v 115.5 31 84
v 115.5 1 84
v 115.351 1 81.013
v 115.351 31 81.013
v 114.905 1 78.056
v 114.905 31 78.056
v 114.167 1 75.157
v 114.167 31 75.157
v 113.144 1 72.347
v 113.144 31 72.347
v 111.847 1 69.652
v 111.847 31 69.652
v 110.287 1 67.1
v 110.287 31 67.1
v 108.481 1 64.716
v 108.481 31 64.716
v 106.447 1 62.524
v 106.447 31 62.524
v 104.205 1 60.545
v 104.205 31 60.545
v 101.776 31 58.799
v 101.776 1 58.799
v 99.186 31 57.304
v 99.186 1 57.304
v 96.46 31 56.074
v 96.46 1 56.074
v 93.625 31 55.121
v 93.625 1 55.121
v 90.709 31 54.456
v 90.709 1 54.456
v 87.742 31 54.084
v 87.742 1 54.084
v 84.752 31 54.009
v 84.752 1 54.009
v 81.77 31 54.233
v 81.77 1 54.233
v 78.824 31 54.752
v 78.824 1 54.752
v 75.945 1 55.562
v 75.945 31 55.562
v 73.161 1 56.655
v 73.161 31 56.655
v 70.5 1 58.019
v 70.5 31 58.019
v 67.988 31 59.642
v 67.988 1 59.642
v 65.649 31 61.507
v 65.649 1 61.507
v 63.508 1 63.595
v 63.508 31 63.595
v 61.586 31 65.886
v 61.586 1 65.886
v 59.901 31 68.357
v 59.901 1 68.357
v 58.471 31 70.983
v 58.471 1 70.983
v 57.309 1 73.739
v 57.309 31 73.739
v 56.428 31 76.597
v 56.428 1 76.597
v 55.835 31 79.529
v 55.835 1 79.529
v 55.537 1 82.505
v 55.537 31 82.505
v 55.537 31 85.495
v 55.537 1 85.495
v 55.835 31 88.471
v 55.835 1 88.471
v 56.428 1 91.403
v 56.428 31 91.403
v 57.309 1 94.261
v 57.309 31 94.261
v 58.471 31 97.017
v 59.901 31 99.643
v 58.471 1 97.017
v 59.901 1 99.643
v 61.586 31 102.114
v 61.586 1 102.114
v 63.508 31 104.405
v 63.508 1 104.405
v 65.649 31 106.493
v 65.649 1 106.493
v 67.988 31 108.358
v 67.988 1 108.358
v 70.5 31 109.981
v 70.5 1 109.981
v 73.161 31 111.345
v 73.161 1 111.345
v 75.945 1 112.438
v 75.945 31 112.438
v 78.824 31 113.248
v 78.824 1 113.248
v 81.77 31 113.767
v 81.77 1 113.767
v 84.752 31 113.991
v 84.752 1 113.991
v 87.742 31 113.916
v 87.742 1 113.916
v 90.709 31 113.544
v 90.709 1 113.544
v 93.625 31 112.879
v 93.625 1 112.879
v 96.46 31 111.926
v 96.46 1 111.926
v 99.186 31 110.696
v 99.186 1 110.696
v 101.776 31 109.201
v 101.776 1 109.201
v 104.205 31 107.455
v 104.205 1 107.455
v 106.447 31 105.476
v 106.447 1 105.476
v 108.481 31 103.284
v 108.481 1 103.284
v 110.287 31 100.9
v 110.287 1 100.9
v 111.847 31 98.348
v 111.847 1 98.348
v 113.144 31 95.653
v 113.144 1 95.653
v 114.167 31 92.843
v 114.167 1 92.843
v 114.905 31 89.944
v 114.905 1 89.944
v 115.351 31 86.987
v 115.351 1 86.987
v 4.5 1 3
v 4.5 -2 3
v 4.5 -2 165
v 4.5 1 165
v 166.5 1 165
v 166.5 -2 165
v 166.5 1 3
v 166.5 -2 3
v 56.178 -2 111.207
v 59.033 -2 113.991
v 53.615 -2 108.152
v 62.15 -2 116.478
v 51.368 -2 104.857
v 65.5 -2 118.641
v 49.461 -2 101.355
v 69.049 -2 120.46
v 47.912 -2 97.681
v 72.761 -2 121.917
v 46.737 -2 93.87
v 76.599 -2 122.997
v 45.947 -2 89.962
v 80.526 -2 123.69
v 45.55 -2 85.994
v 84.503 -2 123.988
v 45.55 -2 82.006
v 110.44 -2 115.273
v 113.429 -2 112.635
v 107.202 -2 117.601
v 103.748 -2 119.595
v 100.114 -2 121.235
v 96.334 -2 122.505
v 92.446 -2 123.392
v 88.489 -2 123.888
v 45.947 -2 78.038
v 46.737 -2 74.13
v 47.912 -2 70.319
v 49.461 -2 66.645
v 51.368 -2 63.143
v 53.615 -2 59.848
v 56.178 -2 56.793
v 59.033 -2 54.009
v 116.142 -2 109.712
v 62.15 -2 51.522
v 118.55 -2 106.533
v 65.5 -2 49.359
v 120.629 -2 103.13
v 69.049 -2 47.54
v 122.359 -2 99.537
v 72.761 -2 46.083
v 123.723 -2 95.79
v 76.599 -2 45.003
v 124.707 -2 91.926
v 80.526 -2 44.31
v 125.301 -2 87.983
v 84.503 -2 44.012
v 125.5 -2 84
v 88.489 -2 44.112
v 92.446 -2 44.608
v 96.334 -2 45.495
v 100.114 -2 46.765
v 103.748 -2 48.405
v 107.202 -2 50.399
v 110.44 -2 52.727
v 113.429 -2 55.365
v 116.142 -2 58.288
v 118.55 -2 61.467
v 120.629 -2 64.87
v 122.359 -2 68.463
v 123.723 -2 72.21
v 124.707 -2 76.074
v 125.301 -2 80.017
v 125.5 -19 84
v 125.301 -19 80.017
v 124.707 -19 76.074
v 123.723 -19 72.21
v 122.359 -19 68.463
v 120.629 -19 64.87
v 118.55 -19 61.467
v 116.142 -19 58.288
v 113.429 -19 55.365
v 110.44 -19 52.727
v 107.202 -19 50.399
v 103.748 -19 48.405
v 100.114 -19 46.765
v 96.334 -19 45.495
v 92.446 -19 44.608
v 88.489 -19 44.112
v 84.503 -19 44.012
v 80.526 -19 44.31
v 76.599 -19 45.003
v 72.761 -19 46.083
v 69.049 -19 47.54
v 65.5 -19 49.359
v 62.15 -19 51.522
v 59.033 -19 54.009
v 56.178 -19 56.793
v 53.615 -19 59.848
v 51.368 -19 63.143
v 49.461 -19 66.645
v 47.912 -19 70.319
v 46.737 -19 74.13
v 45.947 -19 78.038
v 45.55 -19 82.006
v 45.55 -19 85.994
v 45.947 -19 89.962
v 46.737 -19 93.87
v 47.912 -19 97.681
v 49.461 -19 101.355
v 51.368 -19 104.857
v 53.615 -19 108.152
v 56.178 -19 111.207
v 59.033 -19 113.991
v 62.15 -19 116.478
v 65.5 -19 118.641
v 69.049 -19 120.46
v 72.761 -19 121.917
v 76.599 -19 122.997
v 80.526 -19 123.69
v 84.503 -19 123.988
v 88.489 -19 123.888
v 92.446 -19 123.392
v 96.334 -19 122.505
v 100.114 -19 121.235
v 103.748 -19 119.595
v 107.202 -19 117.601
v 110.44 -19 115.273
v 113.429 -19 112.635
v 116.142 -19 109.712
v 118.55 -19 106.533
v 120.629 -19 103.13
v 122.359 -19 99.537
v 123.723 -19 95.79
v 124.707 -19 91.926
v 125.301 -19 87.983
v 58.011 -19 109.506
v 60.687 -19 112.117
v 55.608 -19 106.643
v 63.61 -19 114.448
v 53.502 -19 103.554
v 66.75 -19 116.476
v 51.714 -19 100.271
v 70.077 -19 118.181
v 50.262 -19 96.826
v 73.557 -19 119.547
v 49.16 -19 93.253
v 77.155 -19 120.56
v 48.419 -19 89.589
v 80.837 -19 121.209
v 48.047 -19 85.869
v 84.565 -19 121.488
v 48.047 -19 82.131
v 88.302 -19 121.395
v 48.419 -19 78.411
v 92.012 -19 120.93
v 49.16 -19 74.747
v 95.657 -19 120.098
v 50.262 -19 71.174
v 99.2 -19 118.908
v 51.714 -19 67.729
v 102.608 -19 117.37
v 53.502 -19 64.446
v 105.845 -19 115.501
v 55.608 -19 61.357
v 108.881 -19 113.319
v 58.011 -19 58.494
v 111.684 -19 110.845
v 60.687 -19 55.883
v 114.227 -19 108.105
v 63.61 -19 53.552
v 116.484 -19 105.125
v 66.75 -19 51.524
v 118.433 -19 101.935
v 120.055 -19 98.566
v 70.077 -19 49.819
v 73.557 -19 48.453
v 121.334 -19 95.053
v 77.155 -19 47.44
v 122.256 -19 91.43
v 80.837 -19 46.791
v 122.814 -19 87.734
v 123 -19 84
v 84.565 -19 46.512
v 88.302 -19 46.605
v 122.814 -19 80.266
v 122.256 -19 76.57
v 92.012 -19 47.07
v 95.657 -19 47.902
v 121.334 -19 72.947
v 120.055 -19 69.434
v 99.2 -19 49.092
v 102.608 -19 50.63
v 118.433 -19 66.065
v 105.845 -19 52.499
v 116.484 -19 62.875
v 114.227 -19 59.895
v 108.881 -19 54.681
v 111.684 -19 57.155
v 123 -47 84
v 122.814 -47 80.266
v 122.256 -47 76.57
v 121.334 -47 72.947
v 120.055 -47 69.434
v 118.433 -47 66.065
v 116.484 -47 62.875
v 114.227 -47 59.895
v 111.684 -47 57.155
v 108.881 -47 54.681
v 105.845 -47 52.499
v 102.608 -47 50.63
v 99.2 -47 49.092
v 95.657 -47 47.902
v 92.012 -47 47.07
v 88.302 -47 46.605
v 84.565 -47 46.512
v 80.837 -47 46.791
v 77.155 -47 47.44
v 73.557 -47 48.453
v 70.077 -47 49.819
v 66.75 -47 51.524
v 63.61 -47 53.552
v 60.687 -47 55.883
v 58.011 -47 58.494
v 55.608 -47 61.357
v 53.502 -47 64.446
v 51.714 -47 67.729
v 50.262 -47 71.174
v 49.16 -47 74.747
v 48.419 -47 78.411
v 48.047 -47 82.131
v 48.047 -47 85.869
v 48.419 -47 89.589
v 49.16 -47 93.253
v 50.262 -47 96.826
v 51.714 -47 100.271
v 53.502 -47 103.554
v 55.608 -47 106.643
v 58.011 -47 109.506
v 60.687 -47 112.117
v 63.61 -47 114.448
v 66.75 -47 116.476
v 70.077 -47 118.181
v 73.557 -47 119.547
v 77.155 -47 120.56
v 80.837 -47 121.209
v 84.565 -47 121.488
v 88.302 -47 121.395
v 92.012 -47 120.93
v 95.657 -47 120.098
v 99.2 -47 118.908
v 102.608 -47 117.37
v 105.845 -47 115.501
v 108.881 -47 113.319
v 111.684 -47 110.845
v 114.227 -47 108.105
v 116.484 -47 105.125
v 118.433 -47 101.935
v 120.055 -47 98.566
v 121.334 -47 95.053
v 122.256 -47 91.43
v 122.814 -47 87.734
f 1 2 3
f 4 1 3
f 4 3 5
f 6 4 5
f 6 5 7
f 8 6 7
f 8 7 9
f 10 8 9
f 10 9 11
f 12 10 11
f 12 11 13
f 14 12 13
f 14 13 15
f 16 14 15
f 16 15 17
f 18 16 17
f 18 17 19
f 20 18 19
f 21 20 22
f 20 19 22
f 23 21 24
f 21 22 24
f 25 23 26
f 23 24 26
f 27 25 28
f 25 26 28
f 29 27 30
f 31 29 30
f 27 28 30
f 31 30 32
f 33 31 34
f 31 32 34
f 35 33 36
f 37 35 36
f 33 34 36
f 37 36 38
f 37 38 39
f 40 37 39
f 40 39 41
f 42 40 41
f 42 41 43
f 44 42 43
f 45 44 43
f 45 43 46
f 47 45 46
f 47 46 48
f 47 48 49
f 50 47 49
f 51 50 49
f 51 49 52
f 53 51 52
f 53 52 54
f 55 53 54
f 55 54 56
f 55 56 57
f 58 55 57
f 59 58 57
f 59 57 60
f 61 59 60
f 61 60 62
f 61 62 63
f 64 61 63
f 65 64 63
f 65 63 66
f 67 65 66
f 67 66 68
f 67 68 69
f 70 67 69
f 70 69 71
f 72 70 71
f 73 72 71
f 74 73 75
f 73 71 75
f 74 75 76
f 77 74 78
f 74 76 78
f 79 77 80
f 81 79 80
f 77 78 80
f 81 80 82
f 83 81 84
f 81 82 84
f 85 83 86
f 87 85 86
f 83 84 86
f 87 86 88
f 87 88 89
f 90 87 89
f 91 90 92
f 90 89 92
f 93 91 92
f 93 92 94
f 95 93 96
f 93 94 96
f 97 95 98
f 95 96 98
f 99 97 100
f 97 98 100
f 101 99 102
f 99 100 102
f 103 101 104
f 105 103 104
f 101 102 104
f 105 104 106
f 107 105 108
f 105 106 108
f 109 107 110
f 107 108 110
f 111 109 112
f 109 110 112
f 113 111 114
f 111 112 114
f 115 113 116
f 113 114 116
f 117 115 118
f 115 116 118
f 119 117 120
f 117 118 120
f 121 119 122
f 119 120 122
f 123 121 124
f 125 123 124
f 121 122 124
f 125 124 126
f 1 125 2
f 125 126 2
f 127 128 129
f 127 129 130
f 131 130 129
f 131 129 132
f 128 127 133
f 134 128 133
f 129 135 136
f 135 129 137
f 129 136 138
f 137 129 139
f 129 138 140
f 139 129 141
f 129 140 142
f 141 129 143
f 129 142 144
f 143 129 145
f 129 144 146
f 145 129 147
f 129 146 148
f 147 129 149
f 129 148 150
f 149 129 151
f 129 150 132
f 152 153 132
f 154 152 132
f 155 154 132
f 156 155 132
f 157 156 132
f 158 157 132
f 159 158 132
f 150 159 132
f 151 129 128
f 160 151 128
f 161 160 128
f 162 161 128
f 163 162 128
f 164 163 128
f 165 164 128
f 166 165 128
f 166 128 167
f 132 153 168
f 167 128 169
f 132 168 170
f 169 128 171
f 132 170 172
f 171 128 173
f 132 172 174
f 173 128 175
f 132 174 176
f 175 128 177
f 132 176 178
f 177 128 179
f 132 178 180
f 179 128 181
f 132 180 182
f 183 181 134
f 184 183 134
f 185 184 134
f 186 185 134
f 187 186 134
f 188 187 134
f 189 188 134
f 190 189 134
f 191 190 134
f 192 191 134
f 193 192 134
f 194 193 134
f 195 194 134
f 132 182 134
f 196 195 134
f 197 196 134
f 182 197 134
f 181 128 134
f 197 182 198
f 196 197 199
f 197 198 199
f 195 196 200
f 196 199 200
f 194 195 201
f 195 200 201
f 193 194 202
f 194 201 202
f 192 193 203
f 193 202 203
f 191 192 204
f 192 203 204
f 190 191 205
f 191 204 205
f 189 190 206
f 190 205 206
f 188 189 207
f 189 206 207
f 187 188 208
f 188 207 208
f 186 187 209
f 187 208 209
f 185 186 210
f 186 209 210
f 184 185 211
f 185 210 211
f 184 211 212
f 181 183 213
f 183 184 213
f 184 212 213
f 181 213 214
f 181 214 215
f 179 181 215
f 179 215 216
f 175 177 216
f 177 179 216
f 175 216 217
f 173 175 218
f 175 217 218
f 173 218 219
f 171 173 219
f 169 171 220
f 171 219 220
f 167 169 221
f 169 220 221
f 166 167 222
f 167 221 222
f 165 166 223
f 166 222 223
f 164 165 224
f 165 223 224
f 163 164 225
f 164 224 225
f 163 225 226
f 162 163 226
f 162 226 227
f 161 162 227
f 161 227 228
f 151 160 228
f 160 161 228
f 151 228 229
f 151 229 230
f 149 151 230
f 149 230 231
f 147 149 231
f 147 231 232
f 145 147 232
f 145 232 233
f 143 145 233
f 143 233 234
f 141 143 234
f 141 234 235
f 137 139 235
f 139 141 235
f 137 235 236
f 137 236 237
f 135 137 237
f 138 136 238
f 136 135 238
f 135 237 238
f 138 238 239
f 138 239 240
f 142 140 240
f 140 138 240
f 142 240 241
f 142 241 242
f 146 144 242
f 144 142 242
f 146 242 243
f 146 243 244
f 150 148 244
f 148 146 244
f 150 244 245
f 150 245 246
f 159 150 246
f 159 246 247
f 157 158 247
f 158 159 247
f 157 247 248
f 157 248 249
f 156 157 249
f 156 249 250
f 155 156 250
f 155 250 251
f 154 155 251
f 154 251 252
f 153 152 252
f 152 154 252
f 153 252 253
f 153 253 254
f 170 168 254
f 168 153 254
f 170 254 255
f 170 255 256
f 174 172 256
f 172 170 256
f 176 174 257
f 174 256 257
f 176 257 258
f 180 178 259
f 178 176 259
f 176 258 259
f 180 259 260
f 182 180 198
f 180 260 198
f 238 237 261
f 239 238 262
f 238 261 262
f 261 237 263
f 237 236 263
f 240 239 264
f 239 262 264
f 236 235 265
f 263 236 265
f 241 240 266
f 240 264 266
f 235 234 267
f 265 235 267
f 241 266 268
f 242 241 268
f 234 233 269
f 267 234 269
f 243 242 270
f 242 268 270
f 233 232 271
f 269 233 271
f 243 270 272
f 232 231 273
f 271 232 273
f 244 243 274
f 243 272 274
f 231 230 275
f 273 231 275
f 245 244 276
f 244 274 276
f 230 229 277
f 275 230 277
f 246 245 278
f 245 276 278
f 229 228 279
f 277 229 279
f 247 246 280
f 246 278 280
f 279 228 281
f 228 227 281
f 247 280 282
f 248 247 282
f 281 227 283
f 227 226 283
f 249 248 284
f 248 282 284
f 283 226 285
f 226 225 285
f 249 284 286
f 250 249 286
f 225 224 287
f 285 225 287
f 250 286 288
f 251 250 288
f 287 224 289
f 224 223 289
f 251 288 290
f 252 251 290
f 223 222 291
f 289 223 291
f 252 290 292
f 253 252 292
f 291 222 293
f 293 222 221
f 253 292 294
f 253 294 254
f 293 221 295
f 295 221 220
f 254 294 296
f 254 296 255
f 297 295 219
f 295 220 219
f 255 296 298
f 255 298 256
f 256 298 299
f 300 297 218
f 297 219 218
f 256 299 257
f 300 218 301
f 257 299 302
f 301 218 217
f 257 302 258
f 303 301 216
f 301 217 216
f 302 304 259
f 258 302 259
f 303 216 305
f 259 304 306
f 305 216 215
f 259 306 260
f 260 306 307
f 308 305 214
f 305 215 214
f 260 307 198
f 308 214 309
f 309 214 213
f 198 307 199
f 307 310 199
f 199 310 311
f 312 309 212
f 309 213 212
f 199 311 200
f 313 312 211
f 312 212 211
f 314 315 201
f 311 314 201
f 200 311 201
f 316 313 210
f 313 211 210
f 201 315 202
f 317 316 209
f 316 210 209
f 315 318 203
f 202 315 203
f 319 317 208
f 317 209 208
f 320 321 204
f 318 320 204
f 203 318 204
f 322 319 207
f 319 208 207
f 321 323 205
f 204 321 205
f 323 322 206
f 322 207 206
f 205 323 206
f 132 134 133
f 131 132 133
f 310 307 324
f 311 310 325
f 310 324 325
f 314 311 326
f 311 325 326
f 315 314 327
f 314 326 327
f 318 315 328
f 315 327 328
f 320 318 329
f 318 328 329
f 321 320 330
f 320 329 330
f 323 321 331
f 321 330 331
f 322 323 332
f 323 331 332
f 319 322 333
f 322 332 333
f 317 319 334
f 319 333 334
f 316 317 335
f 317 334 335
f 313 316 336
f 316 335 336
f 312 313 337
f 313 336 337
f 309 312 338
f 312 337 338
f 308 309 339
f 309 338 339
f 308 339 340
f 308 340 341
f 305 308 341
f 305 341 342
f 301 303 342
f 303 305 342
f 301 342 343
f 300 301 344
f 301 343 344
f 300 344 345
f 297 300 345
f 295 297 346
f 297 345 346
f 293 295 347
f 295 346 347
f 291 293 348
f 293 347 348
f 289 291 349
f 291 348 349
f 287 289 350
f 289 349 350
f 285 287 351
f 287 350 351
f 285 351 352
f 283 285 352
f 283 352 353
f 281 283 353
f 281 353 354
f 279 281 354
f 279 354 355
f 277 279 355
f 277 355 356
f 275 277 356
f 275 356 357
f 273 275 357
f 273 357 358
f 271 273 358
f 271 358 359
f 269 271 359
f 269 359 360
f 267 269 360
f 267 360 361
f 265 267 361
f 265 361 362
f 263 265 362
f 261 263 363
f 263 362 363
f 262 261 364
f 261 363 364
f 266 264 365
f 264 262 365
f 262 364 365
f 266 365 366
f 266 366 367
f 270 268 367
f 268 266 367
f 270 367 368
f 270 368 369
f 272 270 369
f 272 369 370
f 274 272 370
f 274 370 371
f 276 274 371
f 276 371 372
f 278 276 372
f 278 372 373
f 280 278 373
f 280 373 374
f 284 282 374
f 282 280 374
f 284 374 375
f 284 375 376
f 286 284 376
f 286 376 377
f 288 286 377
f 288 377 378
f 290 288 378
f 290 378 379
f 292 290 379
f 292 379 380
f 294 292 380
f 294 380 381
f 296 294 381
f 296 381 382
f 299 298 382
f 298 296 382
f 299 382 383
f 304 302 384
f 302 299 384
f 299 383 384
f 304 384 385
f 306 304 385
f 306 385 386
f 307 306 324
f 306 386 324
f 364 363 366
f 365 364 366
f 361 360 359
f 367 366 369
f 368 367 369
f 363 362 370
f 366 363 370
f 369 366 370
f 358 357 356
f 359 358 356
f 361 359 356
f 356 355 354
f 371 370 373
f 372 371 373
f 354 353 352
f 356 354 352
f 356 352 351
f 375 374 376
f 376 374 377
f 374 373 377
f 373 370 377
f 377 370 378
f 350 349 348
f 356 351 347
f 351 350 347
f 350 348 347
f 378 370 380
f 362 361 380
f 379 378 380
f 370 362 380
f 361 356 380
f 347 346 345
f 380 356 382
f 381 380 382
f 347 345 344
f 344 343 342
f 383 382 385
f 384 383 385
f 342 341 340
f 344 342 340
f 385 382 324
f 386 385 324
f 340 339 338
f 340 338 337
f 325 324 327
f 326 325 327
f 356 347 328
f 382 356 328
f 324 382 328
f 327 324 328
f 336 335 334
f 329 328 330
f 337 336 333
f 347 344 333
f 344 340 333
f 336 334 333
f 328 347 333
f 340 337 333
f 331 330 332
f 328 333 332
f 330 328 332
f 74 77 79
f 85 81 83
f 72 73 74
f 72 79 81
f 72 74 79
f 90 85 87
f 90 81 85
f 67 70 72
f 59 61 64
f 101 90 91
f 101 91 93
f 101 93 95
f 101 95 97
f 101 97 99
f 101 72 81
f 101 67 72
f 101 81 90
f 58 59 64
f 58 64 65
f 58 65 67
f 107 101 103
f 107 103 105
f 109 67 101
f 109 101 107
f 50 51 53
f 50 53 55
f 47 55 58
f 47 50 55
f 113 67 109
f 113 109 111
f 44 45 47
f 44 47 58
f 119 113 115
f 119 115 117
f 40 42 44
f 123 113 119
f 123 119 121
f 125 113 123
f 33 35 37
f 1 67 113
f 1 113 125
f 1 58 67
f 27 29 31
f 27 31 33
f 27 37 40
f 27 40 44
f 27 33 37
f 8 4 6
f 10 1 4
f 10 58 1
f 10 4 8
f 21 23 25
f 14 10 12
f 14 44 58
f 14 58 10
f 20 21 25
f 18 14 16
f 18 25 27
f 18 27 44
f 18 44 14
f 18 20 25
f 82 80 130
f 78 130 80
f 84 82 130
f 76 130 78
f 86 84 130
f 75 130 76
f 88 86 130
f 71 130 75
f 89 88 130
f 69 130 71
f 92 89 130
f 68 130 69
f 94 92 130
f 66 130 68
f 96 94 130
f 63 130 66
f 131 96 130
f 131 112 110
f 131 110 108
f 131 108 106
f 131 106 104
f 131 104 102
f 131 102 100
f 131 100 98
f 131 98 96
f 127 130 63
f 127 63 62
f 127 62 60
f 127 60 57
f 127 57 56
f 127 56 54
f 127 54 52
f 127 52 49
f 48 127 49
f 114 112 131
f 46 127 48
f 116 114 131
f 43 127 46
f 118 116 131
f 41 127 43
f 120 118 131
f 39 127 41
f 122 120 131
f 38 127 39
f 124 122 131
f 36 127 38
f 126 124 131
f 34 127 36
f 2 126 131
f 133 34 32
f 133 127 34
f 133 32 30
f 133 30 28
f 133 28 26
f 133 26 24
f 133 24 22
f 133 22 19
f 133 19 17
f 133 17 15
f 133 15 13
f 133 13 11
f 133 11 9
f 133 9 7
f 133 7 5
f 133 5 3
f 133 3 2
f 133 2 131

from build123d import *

# Parameters (mm, degrees)
BOX035_W          = 162
BOX035_H          = 3
BOX035_DEPTH      = 162
CYLINDER010_R     = 30
CYLINDER010_DEPTH = 31
CYLINDER011_R     = 37.5
CYLINDER011_DEPTH = 46
CYLINDER012_R     = 40
CYLINDER012_DEPTH = 18


with BuildPart() as cube030:
    # Box035 → Box035 (new body)
    with BuildSketch(Plane.XY):
        with Locations((81, 1.5)):
            Rectangle(BOX035_W, BOX035_H)
    extrude(amount=BOX035_DEPTH)


with BuildPart() as cylinder010:
    # Cylinder010 → Cylinder010 (new body)
    with BuildSketch(Plane(origin=(81, 2, 81), x_dir=(1, 0, 0), z_dir=(0, 1, 0))):
        Circle(CYLINDER010_R)
    extrude(amount=CYLINDER010_DEPTH)


with BuildPart() as cylinder011:
    # Cylinder011 → Cylinder011 (new body)
    with BuildSketch(Plane(origin=(81, -45, 81), x_dir=(1, 0, 0), z_dir=(0, 1, 0))):
        Circle(CYLINDER011_R)
    extrude(amount=CYLINDER011_DEPTH)


with BuildPart() as f_240mm:
    # Cylinder012 → Cylinder012 (new body)
    with BuildSketch(Plane(origin=(81, -17, 81), x_dir=(1, 0, 0), z_dir=(0, 1, 0))):
        Circle(CYLINDER012_R)
    extrude(amount=CYLINDER012_DEPTH)

    # Fusion008: union Cube030, Cylinder010, Cylinder011
    add(cube030.part)
    add(cylinder010.part)
    add(cylinder011.part)


with BuildPart() as f_240mm_1:
    # Fusion008 placement: moved
    add(f_240mm.part.moved(Location((4.5, -2, 3))))


solid = f_240mm_1.part
